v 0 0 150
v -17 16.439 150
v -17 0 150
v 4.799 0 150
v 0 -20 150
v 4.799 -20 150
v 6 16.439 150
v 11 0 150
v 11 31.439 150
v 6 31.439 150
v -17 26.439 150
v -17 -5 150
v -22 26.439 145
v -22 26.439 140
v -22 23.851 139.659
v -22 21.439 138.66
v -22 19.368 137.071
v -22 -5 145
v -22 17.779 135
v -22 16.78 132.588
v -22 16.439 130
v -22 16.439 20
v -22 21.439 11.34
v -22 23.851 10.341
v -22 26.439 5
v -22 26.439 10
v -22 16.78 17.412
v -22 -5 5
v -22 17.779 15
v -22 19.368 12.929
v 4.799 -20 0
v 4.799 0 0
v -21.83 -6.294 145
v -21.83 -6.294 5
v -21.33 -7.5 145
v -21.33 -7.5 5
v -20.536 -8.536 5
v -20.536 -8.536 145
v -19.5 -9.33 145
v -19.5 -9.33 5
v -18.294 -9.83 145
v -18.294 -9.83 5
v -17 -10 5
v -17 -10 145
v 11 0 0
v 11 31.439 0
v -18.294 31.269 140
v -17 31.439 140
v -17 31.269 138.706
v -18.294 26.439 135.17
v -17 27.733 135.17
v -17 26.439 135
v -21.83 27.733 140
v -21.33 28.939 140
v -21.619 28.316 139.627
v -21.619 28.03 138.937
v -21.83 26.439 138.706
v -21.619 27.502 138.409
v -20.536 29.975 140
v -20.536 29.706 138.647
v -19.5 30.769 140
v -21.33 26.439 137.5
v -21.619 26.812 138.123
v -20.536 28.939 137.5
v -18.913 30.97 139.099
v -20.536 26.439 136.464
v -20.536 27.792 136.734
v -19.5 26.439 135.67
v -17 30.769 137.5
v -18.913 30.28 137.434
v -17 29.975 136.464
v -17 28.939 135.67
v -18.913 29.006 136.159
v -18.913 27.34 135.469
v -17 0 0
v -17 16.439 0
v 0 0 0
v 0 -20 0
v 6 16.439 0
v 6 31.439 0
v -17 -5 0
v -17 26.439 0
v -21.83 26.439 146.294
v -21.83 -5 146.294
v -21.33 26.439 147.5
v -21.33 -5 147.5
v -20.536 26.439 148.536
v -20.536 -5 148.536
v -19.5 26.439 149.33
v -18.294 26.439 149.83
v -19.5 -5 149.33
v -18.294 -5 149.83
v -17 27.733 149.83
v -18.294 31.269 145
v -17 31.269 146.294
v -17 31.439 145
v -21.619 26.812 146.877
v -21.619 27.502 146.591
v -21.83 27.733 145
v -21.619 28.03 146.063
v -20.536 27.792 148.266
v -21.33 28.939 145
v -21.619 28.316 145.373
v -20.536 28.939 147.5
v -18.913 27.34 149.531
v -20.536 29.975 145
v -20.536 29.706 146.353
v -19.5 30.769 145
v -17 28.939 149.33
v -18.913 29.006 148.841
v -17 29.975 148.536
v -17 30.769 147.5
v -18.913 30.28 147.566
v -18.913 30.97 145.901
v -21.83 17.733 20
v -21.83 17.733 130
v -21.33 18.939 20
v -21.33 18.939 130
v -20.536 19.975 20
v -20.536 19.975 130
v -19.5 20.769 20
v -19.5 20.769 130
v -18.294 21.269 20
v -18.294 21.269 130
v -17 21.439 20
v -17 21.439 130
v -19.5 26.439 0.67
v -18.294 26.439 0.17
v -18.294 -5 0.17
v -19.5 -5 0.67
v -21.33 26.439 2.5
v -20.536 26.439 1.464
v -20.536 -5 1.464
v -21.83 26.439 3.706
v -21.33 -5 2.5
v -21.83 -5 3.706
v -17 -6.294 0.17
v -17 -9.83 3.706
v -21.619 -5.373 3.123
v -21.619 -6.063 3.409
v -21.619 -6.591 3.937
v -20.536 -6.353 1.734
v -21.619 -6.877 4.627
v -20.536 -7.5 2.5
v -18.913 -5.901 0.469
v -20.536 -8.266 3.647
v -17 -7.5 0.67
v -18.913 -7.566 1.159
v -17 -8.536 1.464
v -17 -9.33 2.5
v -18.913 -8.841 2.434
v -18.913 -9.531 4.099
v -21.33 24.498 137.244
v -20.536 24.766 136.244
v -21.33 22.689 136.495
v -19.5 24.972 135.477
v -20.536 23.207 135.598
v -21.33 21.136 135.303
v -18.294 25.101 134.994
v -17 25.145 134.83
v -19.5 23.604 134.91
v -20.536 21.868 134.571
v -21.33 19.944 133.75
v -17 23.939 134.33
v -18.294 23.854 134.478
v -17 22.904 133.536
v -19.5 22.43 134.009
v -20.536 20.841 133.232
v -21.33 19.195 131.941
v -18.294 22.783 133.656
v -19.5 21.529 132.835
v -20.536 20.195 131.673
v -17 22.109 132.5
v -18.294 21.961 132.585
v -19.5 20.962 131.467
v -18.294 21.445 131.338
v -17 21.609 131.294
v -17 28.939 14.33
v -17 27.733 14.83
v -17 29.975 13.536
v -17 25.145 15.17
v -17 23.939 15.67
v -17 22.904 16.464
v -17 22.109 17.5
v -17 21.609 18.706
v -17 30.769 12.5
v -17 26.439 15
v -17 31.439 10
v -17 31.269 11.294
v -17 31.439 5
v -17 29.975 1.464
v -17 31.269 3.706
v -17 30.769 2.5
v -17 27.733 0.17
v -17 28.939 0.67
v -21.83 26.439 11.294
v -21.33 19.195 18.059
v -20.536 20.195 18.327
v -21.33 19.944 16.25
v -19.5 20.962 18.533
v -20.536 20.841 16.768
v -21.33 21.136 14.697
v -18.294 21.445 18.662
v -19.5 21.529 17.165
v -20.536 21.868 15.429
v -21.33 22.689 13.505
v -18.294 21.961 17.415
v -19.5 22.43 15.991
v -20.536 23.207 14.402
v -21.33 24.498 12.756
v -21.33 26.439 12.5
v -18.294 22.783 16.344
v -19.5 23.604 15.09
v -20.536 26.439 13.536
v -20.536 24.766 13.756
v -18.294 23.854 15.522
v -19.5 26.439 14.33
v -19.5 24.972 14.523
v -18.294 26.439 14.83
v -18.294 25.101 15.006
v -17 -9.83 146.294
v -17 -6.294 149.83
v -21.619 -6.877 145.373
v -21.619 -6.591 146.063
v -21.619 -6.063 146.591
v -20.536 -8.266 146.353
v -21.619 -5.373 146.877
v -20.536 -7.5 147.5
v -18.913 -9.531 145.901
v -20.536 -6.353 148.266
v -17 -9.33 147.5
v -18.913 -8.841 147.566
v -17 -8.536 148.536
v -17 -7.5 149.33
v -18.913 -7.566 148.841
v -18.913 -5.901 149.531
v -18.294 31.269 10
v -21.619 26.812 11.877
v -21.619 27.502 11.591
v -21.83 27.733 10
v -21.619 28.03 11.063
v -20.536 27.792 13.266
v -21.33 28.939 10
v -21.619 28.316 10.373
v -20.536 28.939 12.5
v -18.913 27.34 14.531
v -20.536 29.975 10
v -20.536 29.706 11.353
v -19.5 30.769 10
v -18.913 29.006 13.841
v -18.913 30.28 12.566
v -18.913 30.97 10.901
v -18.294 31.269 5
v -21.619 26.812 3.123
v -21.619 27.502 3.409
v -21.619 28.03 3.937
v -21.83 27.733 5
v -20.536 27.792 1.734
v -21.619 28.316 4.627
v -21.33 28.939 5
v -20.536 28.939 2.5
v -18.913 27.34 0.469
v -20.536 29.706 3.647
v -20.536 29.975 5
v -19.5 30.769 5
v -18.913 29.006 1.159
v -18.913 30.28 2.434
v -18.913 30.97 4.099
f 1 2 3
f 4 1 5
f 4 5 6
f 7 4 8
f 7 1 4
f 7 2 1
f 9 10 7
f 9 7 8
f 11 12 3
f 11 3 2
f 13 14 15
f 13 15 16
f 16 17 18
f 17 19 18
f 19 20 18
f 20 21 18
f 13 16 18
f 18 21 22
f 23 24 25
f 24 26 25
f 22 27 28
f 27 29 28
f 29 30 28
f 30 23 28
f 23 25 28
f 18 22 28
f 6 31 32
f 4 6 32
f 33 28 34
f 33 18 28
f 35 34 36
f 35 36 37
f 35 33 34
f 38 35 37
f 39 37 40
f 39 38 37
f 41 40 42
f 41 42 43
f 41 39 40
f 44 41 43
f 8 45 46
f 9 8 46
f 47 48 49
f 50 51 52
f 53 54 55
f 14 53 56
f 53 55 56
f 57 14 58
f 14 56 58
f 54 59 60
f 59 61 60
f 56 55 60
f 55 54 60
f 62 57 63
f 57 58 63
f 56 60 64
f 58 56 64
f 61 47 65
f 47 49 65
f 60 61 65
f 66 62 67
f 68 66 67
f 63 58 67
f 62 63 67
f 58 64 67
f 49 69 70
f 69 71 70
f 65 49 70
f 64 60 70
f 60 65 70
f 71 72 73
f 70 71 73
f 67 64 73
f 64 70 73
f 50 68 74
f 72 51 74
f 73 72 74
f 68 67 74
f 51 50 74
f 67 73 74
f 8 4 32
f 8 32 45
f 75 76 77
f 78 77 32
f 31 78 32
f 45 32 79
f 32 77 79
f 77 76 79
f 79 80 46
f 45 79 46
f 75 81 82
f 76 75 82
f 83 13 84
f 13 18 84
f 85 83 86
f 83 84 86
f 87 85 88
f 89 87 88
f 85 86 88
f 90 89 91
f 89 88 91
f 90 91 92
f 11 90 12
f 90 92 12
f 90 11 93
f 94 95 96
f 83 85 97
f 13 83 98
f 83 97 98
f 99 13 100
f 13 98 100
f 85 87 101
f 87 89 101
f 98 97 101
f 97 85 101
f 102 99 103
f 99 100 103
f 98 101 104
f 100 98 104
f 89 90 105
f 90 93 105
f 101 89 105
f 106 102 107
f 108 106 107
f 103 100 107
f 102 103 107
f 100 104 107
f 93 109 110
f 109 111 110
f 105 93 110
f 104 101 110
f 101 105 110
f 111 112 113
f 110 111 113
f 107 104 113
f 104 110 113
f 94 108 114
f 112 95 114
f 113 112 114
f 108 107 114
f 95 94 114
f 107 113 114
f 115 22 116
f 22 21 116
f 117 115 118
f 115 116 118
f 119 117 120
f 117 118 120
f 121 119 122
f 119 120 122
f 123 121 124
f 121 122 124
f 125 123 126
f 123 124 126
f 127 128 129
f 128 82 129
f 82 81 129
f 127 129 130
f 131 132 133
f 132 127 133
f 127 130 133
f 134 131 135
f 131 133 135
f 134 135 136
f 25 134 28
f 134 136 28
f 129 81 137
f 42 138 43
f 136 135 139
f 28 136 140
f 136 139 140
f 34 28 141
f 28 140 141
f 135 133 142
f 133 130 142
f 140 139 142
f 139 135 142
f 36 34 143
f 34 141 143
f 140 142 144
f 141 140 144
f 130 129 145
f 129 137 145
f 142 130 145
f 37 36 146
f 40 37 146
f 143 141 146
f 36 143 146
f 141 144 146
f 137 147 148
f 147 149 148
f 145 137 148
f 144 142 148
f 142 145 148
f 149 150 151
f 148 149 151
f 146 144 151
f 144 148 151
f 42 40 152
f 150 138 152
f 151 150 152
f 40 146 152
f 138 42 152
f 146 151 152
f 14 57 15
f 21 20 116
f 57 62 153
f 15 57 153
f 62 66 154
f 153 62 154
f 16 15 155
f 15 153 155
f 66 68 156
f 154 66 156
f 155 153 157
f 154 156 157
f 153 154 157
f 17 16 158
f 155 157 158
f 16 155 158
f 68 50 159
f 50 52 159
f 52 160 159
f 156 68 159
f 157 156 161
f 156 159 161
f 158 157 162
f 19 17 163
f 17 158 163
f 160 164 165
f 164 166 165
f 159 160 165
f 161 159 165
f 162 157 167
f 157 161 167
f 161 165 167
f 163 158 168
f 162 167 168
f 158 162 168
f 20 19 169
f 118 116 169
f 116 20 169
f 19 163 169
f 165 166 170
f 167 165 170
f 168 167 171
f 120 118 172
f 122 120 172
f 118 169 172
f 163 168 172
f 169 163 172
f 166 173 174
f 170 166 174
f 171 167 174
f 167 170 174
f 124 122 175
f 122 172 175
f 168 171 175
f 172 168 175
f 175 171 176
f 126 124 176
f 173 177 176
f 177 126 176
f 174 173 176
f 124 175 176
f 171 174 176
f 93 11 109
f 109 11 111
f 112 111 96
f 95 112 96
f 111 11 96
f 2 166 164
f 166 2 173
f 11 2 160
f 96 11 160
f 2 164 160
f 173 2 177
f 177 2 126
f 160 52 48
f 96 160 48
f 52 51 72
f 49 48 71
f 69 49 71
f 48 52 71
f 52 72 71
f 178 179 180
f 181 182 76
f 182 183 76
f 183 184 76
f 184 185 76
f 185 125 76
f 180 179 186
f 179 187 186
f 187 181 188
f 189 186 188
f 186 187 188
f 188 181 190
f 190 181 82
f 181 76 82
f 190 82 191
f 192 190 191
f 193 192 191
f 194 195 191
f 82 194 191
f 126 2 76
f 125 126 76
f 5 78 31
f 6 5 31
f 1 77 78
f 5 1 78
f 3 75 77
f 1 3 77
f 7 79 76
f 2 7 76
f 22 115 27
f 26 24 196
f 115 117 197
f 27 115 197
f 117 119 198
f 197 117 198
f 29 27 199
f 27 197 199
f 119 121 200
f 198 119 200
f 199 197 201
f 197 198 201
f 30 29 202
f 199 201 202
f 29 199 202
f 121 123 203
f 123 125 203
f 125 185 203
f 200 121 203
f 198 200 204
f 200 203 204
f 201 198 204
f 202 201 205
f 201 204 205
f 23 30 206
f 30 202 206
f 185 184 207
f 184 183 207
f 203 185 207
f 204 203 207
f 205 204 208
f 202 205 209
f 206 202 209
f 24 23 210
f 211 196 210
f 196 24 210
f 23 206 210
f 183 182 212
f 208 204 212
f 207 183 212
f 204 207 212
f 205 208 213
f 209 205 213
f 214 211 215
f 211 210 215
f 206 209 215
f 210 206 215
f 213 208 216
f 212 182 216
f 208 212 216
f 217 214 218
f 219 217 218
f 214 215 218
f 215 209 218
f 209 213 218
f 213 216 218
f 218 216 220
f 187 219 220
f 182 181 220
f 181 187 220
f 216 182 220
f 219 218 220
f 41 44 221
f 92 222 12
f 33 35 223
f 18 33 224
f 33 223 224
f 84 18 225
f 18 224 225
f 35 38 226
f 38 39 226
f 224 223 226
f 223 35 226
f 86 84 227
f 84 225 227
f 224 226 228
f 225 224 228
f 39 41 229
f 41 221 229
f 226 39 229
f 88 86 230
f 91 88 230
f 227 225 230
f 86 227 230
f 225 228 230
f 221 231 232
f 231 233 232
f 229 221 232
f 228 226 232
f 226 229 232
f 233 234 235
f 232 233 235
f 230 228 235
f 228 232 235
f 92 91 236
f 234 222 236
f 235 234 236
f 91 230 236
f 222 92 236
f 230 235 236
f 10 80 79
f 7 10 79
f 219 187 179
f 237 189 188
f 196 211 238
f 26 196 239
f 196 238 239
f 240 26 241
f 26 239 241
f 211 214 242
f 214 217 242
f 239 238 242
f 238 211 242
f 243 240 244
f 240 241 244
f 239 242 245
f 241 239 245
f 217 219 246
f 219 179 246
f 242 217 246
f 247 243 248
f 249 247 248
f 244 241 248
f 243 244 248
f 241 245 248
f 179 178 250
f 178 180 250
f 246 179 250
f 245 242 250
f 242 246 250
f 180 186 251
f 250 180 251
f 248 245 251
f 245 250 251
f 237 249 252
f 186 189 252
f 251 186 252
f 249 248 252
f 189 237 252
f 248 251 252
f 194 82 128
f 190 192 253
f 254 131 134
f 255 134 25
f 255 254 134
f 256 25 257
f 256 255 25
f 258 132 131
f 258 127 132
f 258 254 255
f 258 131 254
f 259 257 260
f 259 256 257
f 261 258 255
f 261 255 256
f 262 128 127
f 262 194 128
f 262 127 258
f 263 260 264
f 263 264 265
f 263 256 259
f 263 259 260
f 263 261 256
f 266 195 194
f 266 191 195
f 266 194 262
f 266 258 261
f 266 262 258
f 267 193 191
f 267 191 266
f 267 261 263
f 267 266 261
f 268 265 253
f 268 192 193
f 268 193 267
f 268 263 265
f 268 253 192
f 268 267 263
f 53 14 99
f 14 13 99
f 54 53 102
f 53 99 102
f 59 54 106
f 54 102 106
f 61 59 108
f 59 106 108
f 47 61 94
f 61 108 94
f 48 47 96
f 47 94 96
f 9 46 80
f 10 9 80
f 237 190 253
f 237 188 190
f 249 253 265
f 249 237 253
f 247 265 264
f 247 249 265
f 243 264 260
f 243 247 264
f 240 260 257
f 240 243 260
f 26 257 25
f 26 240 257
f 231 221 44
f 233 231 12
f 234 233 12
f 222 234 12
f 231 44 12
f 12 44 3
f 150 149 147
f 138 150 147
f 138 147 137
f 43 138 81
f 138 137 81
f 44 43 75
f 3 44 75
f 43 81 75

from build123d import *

# Parameters (mm, degrees)
F1_DEPTH = 150
F2_W     = 34.5892625776
F2_H     = 120
F3_DEPTH = 25
F4_R     = 4.99999


# Not quite as in the source:
# - a fillet or chamfer is up to 0.001 mm smaller than in the source, because OpenCascade refuses the exact size


with BuildPart() as f1:
    # F0 (on Top) → F1 (new body)
    with BuildSketch(Plane.XY):
        Polygon((-17, 31.4391109618), (-22, 31.4391109618), (-22, -10), (-17, -10), (-17, 0), (0, 0), (0, -20), (4.7985620563, -20), (4.7985620563, 0), (11, 0), (11, 31.4391109618), (6, 31.4391109618), (6, 16.4391109618), (-17, 16.4391109618), align=None)
    extrude(amount=F1_DEPTH)

    # F2 (on Right) → F3 (cut)
    with BuildSketch(Plane.YZ):
        with Locations((38.7337422506, 75)):
            Rectangle(F2_W, F2_H)
    extrude(amount=-F3_DEPTH, mode=Mode.SUBTRACT)

    # F4 (radius 5 in the source; OpenCascade refuses exactly that, so slightly less here)
    f4_edges = [f1.edges().sort_by_distance(p)[0] for p in [
        (-19.5, 21.439111, 135),
        (-19.5, 31.439111, 135),
        (-19.5, 21.439111, 15),
        (-19.5, 31.439111, 15),
        (-19.5, 31.439111, 150),
        (-19.5, -10, 150),
        (-19.5, 31.439111, 0),
        (-19.5, -10, 0),
        (-22, 10.719555, 0),
        (-22, -10, 75),
        (-22, 10.719555, 150),
        (-22, 31.439111, 142.5),
        (-22, 26.439111, 135),
        (-22, 21.439111, 75),
        (-22, 26.439111, 15),
        (-22, 31.439111, 7.5),
    ]]
    fillet(f4_edges, radius=F4_R)


solid = f1.part
